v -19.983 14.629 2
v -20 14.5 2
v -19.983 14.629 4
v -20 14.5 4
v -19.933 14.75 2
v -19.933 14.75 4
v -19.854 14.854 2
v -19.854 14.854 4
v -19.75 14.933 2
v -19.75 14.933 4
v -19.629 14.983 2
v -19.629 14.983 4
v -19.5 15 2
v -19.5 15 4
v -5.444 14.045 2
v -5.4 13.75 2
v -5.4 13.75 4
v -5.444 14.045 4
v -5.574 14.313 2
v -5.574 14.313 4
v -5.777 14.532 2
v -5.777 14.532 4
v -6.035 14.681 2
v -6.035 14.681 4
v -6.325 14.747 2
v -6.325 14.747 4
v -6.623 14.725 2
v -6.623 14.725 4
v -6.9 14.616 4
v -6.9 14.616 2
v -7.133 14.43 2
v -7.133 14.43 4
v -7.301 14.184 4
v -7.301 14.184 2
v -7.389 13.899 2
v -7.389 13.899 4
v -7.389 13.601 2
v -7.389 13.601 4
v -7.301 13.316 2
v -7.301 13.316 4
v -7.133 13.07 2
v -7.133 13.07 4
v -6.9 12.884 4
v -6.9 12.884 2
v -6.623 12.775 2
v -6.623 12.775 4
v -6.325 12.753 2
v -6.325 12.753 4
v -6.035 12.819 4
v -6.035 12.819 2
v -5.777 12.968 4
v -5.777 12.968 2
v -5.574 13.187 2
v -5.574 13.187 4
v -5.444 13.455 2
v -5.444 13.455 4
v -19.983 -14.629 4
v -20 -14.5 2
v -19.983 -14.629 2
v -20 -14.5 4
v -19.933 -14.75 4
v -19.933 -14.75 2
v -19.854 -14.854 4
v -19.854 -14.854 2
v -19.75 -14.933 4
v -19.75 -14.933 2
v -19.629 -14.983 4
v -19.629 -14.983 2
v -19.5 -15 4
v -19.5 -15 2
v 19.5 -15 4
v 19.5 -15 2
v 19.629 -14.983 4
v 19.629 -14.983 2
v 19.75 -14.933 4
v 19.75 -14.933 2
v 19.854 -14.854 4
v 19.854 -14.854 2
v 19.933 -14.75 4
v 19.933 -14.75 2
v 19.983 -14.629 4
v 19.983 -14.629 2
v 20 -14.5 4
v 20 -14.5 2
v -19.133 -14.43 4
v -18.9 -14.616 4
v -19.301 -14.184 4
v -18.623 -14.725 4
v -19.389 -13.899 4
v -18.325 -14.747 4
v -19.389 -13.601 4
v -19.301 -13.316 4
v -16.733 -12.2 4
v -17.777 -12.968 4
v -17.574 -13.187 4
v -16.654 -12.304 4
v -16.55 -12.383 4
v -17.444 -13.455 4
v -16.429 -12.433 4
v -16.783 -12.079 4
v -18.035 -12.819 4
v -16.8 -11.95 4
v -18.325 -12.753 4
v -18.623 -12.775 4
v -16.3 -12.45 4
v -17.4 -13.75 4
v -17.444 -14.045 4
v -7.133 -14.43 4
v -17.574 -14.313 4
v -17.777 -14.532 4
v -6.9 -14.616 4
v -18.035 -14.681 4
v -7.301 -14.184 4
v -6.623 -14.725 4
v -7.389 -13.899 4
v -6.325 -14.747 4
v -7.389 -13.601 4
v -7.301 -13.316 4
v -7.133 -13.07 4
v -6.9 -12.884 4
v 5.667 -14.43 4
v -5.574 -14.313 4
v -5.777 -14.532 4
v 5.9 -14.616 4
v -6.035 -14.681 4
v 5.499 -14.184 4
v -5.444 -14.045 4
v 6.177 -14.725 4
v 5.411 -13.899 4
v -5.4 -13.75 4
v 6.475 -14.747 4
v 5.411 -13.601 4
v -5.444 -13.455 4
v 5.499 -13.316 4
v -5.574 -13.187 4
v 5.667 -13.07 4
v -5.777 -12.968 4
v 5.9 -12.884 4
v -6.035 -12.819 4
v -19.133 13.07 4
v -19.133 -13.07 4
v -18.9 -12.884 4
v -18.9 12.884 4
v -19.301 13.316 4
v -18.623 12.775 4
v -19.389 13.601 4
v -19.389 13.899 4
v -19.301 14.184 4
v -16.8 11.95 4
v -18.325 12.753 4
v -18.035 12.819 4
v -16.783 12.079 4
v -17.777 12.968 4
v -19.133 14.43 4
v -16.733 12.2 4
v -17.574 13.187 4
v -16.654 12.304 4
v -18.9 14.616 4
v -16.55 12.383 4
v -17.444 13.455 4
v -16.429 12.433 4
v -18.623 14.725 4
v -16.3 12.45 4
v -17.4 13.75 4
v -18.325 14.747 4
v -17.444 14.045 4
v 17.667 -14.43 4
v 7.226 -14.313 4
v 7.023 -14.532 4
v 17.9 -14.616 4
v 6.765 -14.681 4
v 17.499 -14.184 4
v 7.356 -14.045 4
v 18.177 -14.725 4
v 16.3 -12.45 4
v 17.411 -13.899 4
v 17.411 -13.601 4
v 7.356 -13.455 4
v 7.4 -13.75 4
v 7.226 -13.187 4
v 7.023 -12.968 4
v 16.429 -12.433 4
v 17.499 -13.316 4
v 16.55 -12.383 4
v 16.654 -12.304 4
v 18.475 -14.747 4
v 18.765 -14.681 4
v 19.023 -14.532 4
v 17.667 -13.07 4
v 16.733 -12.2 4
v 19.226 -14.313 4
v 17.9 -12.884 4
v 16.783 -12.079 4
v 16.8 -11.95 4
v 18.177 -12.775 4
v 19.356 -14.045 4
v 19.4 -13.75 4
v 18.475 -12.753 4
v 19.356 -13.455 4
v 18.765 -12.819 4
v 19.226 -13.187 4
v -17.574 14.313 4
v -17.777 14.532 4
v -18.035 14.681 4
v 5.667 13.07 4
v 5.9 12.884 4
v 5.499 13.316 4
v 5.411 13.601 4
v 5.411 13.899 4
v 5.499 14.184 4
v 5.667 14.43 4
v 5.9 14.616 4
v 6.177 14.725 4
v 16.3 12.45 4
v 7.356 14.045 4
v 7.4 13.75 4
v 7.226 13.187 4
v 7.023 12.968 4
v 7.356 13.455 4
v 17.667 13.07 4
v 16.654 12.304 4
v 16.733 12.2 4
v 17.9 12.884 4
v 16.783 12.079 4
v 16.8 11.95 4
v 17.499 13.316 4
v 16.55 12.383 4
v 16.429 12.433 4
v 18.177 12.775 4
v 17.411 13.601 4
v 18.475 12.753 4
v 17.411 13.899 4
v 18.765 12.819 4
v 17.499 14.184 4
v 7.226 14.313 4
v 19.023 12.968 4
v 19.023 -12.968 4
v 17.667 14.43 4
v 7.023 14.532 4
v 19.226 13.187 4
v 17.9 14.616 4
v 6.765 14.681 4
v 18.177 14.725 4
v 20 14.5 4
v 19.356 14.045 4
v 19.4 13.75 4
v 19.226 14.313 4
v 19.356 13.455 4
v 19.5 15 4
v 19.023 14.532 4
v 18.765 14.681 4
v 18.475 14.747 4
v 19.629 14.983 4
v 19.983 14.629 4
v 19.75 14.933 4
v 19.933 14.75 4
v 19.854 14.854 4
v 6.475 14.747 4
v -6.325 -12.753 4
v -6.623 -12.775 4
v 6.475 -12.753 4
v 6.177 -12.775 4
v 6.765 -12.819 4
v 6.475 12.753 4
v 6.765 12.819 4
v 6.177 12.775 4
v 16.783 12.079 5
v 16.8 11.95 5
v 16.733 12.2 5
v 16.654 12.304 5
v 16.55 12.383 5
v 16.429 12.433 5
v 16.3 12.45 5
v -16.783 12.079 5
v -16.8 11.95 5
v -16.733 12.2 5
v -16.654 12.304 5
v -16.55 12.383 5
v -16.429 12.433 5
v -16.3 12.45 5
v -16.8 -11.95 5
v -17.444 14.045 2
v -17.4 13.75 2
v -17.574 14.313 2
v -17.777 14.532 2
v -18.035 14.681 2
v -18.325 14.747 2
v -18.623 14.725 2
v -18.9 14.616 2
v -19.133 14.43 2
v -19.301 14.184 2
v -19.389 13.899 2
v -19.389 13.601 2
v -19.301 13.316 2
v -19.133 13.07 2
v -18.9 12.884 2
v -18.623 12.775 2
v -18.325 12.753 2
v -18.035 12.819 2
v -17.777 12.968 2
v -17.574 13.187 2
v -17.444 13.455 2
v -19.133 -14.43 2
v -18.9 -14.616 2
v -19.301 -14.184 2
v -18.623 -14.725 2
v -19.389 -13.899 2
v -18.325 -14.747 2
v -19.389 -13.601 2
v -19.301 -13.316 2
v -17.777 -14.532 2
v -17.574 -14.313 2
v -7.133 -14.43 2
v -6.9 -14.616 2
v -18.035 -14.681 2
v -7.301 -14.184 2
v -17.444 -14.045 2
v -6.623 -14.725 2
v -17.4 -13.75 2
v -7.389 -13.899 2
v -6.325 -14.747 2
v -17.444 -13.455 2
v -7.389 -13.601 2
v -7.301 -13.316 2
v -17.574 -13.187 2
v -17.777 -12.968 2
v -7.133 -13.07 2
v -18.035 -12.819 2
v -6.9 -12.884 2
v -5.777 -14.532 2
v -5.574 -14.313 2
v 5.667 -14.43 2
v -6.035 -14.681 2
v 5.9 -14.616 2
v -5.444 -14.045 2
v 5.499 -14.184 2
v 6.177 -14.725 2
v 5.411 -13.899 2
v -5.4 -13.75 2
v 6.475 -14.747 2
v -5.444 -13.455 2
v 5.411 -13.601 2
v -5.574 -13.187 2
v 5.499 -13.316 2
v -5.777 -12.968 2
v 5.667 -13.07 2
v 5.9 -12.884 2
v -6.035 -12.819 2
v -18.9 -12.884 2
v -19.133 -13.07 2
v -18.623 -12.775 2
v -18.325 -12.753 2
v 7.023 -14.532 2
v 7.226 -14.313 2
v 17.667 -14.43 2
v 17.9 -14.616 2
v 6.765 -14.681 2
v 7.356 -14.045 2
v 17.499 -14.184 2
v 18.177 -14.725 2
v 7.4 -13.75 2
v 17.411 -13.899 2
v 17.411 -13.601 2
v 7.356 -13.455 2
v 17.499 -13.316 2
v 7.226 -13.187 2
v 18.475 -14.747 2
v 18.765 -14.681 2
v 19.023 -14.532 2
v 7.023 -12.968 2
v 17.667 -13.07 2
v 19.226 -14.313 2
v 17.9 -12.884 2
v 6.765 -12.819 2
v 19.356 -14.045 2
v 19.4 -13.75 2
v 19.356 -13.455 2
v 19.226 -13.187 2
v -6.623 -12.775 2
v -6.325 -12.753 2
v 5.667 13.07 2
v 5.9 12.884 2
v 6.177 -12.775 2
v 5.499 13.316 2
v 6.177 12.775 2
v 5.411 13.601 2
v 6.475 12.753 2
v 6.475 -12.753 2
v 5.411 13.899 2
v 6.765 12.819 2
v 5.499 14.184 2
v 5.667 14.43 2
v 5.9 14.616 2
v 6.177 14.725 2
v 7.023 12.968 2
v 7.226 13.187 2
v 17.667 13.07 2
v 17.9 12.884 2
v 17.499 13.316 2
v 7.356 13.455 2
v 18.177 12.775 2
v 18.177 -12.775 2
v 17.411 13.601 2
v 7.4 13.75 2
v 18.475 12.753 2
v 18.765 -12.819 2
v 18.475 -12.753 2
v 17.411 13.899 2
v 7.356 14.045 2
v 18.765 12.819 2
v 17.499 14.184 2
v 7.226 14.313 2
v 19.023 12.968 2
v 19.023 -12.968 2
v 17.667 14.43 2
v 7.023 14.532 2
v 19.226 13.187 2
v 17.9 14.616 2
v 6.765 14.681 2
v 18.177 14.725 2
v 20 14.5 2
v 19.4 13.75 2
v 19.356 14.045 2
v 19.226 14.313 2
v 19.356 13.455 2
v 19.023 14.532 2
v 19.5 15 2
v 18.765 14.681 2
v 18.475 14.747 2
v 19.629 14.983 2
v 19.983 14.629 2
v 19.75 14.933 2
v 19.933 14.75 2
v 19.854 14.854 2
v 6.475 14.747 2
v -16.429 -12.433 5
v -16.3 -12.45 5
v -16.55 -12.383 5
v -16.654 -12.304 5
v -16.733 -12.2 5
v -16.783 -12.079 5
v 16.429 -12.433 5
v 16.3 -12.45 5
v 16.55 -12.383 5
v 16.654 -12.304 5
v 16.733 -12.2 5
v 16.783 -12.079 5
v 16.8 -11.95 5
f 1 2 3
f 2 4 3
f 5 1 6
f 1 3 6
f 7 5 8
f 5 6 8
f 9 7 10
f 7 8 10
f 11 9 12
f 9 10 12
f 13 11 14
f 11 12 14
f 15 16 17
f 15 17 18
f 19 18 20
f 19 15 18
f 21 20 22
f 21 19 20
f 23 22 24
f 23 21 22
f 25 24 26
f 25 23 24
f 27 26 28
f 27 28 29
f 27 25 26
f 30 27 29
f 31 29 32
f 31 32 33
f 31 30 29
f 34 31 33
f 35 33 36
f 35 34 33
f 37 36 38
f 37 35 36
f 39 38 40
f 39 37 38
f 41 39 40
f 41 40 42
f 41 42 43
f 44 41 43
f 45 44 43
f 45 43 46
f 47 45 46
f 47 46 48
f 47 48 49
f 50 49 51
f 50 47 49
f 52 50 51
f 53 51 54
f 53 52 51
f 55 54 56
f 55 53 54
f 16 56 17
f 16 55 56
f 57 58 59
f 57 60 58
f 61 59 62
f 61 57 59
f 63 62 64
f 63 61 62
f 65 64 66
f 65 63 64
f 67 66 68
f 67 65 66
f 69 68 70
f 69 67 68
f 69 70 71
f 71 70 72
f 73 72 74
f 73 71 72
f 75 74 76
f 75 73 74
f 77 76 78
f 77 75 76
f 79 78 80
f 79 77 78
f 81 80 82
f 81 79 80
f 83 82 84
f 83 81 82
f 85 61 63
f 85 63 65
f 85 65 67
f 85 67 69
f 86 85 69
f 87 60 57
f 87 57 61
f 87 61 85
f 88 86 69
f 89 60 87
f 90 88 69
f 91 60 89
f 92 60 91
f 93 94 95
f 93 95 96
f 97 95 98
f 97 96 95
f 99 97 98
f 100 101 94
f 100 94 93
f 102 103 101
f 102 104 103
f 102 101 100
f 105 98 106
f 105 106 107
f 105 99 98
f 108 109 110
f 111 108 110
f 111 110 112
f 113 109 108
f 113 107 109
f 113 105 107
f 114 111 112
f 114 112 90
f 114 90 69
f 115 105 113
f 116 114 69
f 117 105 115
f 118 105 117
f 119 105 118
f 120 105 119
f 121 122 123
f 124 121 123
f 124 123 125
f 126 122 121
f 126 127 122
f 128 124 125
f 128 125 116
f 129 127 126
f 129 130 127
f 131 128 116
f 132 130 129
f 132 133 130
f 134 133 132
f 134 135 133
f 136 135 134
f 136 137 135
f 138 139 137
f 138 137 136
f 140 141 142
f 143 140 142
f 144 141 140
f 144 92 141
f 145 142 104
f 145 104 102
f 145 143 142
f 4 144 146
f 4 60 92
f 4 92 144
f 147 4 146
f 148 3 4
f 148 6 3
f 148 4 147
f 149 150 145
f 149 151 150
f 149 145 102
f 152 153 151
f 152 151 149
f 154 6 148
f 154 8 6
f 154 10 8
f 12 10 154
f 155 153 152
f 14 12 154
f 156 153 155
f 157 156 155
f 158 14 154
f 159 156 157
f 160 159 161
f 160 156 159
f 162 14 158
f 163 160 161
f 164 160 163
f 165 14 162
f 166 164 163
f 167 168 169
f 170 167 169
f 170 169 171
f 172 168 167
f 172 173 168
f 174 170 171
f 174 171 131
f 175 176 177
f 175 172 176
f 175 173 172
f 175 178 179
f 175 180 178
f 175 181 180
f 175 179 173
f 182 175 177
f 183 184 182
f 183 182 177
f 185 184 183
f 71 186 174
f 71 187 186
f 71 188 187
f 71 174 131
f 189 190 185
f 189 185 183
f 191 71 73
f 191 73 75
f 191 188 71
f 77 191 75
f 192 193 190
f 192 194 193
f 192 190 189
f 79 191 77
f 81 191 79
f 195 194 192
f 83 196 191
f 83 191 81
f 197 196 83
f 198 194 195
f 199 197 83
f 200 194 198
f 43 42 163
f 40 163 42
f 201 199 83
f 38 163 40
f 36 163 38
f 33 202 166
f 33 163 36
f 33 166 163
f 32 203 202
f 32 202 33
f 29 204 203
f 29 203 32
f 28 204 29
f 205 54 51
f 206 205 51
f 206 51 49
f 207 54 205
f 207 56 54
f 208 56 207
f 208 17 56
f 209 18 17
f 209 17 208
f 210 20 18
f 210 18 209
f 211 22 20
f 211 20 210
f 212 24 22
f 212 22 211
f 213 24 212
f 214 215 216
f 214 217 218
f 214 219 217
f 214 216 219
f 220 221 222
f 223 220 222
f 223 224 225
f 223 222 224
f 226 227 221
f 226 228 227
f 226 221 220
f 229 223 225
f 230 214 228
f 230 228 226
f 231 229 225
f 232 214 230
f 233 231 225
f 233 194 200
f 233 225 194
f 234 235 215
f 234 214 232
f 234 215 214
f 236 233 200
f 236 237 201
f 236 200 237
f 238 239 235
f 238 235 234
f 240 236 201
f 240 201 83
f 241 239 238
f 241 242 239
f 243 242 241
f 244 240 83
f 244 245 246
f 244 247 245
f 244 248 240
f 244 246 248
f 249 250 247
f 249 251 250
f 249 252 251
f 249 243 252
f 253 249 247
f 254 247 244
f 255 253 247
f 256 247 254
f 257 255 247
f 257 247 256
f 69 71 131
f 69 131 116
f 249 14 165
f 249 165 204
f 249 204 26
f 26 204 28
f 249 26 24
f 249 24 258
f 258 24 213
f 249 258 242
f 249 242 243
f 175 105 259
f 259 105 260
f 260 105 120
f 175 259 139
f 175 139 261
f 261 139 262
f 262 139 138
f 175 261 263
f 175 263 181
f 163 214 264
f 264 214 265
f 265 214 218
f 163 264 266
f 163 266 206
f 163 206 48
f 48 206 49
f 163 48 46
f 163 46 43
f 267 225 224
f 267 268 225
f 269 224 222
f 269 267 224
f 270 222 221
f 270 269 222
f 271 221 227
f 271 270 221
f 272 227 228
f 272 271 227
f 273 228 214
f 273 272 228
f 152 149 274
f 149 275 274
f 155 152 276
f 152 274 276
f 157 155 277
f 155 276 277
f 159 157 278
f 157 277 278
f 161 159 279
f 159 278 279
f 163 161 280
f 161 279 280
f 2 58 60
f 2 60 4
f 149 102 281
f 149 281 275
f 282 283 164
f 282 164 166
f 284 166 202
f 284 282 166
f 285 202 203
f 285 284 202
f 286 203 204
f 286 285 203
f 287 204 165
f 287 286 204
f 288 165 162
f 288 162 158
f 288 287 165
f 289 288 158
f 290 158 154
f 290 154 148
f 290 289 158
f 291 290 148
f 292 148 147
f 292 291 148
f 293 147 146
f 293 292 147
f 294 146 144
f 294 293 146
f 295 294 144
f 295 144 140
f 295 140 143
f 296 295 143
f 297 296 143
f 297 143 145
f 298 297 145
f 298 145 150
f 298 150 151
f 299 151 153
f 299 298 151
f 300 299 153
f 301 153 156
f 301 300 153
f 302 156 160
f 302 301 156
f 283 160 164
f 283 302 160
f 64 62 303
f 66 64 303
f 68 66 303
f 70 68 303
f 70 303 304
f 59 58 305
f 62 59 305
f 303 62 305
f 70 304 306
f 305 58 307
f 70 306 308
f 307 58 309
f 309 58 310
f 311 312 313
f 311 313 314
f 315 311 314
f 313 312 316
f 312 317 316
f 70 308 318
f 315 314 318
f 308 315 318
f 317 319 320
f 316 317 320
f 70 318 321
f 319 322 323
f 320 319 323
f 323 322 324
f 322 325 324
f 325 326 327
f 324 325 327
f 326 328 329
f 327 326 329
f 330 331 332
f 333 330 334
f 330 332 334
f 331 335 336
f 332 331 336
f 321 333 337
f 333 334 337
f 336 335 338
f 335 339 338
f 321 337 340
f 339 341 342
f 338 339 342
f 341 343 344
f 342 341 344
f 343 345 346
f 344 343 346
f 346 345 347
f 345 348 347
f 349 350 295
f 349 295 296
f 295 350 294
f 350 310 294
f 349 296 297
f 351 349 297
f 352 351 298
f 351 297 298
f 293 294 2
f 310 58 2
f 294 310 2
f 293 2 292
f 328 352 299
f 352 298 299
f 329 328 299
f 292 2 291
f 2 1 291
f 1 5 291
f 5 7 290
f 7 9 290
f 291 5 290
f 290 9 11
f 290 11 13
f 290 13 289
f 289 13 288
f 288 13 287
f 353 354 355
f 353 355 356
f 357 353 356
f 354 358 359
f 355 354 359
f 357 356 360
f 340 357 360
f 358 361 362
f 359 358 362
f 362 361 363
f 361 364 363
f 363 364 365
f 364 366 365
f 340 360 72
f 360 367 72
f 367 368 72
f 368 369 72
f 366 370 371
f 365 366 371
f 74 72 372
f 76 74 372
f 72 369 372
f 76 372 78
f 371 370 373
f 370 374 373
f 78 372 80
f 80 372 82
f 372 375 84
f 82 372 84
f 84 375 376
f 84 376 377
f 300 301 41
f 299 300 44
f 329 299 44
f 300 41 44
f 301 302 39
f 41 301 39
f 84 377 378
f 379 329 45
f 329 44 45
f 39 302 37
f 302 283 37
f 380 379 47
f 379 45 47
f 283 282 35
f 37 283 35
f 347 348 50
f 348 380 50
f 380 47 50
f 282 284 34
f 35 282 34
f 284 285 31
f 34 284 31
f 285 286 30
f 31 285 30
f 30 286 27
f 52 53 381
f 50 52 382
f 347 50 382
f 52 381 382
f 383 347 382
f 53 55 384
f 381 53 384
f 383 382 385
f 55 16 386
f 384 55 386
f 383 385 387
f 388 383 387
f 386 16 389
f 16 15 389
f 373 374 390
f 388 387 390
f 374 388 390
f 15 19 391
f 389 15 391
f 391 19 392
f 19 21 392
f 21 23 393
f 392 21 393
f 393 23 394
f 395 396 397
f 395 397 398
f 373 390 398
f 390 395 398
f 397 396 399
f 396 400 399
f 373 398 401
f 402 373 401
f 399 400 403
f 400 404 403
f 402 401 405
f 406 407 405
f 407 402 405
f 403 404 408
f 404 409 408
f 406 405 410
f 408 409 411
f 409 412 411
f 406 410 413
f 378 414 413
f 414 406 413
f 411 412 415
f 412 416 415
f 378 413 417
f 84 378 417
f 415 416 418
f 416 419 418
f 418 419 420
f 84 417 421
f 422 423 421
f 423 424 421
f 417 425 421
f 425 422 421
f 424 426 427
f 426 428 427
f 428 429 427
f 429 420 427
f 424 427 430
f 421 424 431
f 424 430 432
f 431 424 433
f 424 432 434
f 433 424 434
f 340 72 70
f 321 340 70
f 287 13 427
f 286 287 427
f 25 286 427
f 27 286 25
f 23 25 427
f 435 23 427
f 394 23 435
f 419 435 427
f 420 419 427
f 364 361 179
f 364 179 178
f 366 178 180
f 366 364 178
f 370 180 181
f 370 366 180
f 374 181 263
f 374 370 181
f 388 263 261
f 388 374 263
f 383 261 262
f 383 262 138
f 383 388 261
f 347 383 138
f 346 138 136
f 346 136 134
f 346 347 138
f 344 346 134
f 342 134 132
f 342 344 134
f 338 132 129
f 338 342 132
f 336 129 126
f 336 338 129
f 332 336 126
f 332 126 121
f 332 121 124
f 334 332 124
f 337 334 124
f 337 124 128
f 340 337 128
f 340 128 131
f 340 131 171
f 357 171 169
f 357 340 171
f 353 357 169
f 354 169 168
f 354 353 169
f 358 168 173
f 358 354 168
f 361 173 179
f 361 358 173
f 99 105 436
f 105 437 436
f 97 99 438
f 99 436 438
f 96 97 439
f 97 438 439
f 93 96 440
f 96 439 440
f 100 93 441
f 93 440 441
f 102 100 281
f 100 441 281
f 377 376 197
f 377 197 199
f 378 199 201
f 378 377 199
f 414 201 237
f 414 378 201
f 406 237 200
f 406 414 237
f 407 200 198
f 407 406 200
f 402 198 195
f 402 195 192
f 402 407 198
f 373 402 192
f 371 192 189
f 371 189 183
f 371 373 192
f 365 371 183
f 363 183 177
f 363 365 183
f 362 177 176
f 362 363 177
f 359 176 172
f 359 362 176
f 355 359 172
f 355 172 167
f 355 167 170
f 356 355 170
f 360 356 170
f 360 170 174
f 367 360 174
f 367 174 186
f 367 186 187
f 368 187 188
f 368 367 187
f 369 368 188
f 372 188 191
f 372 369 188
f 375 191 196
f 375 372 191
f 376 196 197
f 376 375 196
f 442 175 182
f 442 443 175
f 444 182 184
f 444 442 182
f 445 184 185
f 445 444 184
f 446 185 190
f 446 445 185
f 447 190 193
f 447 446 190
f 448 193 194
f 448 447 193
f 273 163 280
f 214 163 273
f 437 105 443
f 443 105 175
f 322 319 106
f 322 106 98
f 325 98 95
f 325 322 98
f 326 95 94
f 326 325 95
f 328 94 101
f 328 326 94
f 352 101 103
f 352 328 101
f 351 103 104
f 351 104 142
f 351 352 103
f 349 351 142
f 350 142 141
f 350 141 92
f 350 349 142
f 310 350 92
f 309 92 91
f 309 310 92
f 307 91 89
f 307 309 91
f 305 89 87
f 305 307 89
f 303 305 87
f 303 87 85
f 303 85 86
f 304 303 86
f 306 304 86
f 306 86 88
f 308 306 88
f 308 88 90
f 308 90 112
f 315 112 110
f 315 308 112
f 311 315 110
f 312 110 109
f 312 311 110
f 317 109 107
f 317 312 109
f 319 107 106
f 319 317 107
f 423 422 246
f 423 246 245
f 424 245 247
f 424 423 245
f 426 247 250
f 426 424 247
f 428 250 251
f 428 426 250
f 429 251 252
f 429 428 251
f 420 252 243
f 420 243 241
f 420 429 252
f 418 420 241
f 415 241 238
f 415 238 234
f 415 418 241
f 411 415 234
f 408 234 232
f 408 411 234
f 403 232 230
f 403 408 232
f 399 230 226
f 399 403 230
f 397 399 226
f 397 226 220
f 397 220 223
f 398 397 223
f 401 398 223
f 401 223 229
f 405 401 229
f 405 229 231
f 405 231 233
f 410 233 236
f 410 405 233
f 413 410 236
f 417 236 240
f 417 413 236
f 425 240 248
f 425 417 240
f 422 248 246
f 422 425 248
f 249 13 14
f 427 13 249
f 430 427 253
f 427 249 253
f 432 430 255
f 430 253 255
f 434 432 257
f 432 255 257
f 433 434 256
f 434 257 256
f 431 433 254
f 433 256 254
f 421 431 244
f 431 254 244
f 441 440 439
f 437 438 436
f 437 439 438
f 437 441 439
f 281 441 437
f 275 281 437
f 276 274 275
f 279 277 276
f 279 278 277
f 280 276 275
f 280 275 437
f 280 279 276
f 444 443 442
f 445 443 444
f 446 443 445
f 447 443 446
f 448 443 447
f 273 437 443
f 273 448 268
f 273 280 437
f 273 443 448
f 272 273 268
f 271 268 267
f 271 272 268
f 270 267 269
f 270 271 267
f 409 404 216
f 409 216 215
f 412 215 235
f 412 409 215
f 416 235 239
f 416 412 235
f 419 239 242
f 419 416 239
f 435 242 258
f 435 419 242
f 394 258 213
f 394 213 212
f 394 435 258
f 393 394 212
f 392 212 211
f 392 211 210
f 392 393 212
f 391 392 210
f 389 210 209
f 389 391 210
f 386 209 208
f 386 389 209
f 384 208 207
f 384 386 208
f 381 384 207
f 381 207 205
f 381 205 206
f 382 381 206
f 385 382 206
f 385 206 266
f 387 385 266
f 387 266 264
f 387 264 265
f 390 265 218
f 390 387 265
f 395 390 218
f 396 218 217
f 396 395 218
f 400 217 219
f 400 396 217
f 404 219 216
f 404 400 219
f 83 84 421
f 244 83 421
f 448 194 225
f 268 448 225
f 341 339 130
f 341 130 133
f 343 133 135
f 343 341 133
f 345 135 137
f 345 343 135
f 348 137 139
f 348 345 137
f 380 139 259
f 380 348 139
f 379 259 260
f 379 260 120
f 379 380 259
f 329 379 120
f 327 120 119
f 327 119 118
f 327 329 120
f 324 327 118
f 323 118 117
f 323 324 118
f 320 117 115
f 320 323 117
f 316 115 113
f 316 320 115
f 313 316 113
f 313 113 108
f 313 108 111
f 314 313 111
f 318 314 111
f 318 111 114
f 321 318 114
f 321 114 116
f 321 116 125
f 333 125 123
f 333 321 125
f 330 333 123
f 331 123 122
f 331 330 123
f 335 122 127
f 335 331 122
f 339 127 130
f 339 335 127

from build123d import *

# Parameters (mm, degrees)
SKETCH_W     = 40
SKETCH_H     = 30
PAD_DEPTH    = 2
SKETCH001_W  = 33.6
SKETCH001_H  = 24.9
PAD001_DEPTH = 1
SKETCH002_R  = 1
POCKET_DEPTH = 2
FILLET_R     = 0.5


with BuildPart() as part:
    # Sketch → Pad (new body)
    with BuildSketch(Plane.XY.offset(2)):
        Rectangle(SKETCH_W, SKETCH_H)
    extrude(amount=PAD_DEPTH)

    # Sketch001 (on Face6 of Pad) → Pad001 (join)
    with BuildSketch(Plane.XY.offset(4)):
        Rectangle(SKETCH001_W, SKETCH001_H)
    extrude(amount=PAD001_DEPTH)

    # Sketch002 → Pocket (cut)
    with BuildSketch(Plane.XY.offset(2)):
        with Locations((-18.4, 13.75)):
            Circle(SKETCH002_R)
        with Locations((-6.4, 13.75)):
            Circle(SKETCH002_R)
        with Locations((6.4, 13.75)):
            Circle(SKETCH002_R)
        with Locations((18.4, 13.75)):
            Circle(SKETCH002_R)
        with Locations((18.4, -13.75)):
            Circle(SKETCH002_R)
        with Locations((6.4, -13.75)):
            Circle(SKETCH002_R)
        with Locations((-6.4, -13.75)):
            Circle(SKETCH002_R)
        with Locations((-18.4, -13.75)):
            Circle(SKETCH002_R)
    extrude(amount=POCKET_DEPTH, mode=Mode.SUBTRACT)

    # Fillet
    fillet_edges = [part.edges().sort_by_distance(p)[0] for p in [
        (20, 15, 3),
        (16.8, 12.45, 4.5),
        (20, -15, 3),
        (16.8, -12.45, 4.5),
        (-20, -15, 3),
        (-16.8, -12.45, 4.5),
        (-20, 15, 3),
        (-16.8, 12.45, 4.5),
    ]]
    fillet(fillet_edges, radius=FILLET_R)


solid = part.part
